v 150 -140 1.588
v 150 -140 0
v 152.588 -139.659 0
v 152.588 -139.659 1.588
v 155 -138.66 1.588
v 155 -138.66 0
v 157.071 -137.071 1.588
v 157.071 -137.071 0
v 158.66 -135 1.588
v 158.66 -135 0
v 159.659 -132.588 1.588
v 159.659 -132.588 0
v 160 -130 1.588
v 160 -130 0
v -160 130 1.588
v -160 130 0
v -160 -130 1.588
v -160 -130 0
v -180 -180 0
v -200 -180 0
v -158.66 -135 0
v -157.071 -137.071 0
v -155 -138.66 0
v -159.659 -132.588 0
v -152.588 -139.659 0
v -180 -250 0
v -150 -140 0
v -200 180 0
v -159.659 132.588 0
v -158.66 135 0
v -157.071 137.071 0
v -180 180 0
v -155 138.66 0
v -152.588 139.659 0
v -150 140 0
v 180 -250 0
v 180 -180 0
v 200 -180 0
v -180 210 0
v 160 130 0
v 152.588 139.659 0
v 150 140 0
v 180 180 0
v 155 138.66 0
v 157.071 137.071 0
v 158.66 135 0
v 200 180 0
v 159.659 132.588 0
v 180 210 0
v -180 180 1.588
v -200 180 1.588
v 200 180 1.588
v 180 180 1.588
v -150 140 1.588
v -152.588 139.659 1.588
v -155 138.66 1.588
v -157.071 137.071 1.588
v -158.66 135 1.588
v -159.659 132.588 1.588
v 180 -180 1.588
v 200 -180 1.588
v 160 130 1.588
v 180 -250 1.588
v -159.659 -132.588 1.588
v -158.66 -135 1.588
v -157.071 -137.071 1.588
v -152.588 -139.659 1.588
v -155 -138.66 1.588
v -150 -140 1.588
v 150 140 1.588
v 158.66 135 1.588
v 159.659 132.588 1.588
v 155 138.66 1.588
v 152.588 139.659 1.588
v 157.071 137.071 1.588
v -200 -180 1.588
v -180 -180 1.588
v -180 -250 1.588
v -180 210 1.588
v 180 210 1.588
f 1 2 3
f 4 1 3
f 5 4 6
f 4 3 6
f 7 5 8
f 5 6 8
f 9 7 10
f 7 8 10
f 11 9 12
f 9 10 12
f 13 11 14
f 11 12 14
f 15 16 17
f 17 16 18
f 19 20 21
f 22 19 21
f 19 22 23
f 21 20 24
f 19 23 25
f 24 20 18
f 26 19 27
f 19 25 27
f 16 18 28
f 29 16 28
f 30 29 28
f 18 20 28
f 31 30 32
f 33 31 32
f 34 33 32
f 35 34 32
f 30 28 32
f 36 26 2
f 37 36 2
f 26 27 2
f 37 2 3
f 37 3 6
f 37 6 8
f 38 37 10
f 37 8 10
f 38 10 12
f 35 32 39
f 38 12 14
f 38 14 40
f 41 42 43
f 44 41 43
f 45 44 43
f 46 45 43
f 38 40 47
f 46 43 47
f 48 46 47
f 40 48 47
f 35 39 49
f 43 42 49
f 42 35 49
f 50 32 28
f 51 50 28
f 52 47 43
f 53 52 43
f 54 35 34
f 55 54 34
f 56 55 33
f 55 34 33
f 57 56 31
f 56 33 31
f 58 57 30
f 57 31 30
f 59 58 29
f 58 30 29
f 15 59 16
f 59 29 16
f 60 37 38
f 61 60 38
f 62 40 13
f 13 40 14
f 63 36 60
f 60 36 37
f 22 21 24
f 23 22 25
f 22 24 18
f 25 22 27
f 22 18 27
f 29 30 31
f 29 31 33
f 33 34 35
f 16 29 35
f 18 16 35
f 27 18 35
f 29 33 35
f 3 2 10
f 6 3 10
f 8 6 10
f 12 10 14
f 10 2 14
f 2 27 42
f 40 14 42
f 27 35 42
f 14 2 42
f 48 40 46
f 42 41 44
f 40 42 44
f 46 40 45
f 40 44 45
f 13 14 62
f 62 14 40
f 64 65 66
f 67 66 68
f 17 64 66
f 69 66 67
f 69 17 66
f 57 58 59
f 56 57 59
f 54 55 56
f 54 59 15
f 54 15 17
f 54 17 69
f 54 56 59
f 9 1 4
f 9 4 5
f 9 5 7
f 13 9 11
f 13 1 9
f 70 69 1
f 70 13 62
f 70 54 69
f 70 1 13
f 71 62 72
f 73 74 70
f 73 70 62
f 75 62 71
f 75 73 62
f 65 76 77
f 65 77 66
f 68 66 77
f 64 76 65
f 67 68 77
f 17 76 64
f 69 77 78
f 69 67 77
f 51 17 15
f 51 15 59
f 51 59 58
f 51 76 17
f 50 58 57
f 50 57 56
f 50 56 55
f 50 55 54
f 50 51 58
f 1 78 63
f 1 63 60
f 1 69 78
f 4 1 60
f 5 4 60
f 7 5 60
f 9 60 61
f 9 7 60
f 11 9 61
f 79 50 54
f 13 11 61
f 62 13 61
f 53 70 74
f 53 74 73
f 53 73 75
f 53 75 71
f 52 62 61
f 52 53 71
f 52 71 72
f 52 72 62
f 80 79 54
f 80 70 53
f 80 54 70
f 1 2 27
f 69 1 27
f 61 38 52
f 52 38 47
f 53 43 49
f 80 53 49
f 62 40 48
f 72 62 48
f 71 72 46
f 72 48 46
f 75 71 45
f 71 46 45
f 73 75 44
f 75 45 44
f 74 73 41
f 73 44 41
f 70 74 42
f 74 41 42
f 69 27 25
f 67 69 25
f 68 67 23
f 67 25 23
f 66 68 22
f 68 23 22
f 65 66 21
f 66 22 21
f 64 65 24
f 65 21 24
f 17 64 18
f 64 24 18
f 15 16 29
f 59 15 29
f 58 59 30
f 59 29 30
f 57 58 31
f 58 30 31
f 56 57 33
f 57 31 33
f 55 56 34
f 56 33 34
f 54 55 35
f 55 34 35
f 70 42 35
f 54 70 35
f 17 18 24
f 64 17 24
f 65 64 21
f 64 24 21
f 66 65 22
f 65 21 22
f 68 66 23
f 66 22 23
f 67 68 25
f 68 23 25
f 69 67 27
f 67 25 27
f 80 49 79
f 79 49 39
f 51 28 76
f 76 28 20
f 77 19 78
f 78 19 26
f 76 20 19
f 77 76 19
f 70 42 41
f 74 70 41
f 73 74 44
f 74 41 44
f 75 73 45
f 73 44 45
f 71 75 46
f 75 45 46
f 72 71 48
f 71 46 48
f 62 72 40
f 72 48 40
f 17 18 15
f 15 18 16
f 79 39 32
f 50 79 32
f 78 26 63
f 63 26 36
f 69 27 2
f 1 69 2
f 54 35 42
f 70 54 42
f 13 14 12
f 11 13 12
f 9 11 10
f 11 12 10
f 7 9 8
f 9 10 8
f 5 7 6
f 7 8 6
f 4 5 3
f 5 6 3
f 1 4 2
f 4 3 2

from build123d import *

# Parameters (mm, degrees)
F1_DEPTH = 1.5875
F2_DEPTH = 1.5875


# Not quite as in the source:
# - a length typed as a fraction of an inch, garbled in the dataset ("3 / 203.2 mm" for 3/8 in), is restored


with BuildPart() as f1:
    # F0 (on Top) → F1 (new body)
    with BuildSketch(Plane.XY):
        Polygon((-200, 180), (-200, -180), (-180, -180), (-180, -250), (0, -250), (180, -250), (180, -180), (200, -180), (200, 180), (180, 180), (180, 210), (0, 210), (-180, 210), (-180, 180), align=None)
        with BuildLine():
            Line((150, -140), (0, -140))
            Line((0, -140), (-150, -140))
            ThreePointArc((-150, -140), (-157.0710678119, -137.0710678119), (-160, -130))
            Line((-160, -130), (-160, 130))
            ThreePointArc((-160, 130), (-157.0710678119, 137.0710678119), (-150, 140))
            Line((-150, 140), (0, 140))
            Line((0, 140), (150, 140))
            ThreePointArc((150, 140), (157.0710678119, 137.0710678119), (160, 130))
            Line((160, 130), (160, -130))
            ThreePointArc((160, -130), (157.0710678119, -137.0710678119), (150, -140))
        make_face(mode=Mode.SUBTRACT)
    extrude(amount=F1_DEPTH)


with BuildPart() as f2:
    # F0 (on Top) → F2 (new body)
    with BuildSketch(Plane.XY):
        with BuildLine():
            Line((-150, -140), (0, -140))
            Line((0, -140), (150, -140))
            ThreePointArc((150, -140), (157.0710678119, -137.0710678119), (160, -130))
            Line((160, -130), (160, 130))
            ThreePointArc((160, 130), (157.0710678119, 137.0710678119), (150, 140))
            Line((150, 140), (0, 140))
            Line((0, 140), (-150, 140))
            ThreePointArc((-150, 140), (-157.0710678119, 137.0710678119), (-160, 130))
            Line((-160, 130), (-160, -130))
            ThreePointArc((-160, -130), (-157.0710678119, -137.0710678119), (-150, -140))
        make_face()
    extrude(amount=F2_DEPTH)


solid = Compound([f1.part, f2.part])
